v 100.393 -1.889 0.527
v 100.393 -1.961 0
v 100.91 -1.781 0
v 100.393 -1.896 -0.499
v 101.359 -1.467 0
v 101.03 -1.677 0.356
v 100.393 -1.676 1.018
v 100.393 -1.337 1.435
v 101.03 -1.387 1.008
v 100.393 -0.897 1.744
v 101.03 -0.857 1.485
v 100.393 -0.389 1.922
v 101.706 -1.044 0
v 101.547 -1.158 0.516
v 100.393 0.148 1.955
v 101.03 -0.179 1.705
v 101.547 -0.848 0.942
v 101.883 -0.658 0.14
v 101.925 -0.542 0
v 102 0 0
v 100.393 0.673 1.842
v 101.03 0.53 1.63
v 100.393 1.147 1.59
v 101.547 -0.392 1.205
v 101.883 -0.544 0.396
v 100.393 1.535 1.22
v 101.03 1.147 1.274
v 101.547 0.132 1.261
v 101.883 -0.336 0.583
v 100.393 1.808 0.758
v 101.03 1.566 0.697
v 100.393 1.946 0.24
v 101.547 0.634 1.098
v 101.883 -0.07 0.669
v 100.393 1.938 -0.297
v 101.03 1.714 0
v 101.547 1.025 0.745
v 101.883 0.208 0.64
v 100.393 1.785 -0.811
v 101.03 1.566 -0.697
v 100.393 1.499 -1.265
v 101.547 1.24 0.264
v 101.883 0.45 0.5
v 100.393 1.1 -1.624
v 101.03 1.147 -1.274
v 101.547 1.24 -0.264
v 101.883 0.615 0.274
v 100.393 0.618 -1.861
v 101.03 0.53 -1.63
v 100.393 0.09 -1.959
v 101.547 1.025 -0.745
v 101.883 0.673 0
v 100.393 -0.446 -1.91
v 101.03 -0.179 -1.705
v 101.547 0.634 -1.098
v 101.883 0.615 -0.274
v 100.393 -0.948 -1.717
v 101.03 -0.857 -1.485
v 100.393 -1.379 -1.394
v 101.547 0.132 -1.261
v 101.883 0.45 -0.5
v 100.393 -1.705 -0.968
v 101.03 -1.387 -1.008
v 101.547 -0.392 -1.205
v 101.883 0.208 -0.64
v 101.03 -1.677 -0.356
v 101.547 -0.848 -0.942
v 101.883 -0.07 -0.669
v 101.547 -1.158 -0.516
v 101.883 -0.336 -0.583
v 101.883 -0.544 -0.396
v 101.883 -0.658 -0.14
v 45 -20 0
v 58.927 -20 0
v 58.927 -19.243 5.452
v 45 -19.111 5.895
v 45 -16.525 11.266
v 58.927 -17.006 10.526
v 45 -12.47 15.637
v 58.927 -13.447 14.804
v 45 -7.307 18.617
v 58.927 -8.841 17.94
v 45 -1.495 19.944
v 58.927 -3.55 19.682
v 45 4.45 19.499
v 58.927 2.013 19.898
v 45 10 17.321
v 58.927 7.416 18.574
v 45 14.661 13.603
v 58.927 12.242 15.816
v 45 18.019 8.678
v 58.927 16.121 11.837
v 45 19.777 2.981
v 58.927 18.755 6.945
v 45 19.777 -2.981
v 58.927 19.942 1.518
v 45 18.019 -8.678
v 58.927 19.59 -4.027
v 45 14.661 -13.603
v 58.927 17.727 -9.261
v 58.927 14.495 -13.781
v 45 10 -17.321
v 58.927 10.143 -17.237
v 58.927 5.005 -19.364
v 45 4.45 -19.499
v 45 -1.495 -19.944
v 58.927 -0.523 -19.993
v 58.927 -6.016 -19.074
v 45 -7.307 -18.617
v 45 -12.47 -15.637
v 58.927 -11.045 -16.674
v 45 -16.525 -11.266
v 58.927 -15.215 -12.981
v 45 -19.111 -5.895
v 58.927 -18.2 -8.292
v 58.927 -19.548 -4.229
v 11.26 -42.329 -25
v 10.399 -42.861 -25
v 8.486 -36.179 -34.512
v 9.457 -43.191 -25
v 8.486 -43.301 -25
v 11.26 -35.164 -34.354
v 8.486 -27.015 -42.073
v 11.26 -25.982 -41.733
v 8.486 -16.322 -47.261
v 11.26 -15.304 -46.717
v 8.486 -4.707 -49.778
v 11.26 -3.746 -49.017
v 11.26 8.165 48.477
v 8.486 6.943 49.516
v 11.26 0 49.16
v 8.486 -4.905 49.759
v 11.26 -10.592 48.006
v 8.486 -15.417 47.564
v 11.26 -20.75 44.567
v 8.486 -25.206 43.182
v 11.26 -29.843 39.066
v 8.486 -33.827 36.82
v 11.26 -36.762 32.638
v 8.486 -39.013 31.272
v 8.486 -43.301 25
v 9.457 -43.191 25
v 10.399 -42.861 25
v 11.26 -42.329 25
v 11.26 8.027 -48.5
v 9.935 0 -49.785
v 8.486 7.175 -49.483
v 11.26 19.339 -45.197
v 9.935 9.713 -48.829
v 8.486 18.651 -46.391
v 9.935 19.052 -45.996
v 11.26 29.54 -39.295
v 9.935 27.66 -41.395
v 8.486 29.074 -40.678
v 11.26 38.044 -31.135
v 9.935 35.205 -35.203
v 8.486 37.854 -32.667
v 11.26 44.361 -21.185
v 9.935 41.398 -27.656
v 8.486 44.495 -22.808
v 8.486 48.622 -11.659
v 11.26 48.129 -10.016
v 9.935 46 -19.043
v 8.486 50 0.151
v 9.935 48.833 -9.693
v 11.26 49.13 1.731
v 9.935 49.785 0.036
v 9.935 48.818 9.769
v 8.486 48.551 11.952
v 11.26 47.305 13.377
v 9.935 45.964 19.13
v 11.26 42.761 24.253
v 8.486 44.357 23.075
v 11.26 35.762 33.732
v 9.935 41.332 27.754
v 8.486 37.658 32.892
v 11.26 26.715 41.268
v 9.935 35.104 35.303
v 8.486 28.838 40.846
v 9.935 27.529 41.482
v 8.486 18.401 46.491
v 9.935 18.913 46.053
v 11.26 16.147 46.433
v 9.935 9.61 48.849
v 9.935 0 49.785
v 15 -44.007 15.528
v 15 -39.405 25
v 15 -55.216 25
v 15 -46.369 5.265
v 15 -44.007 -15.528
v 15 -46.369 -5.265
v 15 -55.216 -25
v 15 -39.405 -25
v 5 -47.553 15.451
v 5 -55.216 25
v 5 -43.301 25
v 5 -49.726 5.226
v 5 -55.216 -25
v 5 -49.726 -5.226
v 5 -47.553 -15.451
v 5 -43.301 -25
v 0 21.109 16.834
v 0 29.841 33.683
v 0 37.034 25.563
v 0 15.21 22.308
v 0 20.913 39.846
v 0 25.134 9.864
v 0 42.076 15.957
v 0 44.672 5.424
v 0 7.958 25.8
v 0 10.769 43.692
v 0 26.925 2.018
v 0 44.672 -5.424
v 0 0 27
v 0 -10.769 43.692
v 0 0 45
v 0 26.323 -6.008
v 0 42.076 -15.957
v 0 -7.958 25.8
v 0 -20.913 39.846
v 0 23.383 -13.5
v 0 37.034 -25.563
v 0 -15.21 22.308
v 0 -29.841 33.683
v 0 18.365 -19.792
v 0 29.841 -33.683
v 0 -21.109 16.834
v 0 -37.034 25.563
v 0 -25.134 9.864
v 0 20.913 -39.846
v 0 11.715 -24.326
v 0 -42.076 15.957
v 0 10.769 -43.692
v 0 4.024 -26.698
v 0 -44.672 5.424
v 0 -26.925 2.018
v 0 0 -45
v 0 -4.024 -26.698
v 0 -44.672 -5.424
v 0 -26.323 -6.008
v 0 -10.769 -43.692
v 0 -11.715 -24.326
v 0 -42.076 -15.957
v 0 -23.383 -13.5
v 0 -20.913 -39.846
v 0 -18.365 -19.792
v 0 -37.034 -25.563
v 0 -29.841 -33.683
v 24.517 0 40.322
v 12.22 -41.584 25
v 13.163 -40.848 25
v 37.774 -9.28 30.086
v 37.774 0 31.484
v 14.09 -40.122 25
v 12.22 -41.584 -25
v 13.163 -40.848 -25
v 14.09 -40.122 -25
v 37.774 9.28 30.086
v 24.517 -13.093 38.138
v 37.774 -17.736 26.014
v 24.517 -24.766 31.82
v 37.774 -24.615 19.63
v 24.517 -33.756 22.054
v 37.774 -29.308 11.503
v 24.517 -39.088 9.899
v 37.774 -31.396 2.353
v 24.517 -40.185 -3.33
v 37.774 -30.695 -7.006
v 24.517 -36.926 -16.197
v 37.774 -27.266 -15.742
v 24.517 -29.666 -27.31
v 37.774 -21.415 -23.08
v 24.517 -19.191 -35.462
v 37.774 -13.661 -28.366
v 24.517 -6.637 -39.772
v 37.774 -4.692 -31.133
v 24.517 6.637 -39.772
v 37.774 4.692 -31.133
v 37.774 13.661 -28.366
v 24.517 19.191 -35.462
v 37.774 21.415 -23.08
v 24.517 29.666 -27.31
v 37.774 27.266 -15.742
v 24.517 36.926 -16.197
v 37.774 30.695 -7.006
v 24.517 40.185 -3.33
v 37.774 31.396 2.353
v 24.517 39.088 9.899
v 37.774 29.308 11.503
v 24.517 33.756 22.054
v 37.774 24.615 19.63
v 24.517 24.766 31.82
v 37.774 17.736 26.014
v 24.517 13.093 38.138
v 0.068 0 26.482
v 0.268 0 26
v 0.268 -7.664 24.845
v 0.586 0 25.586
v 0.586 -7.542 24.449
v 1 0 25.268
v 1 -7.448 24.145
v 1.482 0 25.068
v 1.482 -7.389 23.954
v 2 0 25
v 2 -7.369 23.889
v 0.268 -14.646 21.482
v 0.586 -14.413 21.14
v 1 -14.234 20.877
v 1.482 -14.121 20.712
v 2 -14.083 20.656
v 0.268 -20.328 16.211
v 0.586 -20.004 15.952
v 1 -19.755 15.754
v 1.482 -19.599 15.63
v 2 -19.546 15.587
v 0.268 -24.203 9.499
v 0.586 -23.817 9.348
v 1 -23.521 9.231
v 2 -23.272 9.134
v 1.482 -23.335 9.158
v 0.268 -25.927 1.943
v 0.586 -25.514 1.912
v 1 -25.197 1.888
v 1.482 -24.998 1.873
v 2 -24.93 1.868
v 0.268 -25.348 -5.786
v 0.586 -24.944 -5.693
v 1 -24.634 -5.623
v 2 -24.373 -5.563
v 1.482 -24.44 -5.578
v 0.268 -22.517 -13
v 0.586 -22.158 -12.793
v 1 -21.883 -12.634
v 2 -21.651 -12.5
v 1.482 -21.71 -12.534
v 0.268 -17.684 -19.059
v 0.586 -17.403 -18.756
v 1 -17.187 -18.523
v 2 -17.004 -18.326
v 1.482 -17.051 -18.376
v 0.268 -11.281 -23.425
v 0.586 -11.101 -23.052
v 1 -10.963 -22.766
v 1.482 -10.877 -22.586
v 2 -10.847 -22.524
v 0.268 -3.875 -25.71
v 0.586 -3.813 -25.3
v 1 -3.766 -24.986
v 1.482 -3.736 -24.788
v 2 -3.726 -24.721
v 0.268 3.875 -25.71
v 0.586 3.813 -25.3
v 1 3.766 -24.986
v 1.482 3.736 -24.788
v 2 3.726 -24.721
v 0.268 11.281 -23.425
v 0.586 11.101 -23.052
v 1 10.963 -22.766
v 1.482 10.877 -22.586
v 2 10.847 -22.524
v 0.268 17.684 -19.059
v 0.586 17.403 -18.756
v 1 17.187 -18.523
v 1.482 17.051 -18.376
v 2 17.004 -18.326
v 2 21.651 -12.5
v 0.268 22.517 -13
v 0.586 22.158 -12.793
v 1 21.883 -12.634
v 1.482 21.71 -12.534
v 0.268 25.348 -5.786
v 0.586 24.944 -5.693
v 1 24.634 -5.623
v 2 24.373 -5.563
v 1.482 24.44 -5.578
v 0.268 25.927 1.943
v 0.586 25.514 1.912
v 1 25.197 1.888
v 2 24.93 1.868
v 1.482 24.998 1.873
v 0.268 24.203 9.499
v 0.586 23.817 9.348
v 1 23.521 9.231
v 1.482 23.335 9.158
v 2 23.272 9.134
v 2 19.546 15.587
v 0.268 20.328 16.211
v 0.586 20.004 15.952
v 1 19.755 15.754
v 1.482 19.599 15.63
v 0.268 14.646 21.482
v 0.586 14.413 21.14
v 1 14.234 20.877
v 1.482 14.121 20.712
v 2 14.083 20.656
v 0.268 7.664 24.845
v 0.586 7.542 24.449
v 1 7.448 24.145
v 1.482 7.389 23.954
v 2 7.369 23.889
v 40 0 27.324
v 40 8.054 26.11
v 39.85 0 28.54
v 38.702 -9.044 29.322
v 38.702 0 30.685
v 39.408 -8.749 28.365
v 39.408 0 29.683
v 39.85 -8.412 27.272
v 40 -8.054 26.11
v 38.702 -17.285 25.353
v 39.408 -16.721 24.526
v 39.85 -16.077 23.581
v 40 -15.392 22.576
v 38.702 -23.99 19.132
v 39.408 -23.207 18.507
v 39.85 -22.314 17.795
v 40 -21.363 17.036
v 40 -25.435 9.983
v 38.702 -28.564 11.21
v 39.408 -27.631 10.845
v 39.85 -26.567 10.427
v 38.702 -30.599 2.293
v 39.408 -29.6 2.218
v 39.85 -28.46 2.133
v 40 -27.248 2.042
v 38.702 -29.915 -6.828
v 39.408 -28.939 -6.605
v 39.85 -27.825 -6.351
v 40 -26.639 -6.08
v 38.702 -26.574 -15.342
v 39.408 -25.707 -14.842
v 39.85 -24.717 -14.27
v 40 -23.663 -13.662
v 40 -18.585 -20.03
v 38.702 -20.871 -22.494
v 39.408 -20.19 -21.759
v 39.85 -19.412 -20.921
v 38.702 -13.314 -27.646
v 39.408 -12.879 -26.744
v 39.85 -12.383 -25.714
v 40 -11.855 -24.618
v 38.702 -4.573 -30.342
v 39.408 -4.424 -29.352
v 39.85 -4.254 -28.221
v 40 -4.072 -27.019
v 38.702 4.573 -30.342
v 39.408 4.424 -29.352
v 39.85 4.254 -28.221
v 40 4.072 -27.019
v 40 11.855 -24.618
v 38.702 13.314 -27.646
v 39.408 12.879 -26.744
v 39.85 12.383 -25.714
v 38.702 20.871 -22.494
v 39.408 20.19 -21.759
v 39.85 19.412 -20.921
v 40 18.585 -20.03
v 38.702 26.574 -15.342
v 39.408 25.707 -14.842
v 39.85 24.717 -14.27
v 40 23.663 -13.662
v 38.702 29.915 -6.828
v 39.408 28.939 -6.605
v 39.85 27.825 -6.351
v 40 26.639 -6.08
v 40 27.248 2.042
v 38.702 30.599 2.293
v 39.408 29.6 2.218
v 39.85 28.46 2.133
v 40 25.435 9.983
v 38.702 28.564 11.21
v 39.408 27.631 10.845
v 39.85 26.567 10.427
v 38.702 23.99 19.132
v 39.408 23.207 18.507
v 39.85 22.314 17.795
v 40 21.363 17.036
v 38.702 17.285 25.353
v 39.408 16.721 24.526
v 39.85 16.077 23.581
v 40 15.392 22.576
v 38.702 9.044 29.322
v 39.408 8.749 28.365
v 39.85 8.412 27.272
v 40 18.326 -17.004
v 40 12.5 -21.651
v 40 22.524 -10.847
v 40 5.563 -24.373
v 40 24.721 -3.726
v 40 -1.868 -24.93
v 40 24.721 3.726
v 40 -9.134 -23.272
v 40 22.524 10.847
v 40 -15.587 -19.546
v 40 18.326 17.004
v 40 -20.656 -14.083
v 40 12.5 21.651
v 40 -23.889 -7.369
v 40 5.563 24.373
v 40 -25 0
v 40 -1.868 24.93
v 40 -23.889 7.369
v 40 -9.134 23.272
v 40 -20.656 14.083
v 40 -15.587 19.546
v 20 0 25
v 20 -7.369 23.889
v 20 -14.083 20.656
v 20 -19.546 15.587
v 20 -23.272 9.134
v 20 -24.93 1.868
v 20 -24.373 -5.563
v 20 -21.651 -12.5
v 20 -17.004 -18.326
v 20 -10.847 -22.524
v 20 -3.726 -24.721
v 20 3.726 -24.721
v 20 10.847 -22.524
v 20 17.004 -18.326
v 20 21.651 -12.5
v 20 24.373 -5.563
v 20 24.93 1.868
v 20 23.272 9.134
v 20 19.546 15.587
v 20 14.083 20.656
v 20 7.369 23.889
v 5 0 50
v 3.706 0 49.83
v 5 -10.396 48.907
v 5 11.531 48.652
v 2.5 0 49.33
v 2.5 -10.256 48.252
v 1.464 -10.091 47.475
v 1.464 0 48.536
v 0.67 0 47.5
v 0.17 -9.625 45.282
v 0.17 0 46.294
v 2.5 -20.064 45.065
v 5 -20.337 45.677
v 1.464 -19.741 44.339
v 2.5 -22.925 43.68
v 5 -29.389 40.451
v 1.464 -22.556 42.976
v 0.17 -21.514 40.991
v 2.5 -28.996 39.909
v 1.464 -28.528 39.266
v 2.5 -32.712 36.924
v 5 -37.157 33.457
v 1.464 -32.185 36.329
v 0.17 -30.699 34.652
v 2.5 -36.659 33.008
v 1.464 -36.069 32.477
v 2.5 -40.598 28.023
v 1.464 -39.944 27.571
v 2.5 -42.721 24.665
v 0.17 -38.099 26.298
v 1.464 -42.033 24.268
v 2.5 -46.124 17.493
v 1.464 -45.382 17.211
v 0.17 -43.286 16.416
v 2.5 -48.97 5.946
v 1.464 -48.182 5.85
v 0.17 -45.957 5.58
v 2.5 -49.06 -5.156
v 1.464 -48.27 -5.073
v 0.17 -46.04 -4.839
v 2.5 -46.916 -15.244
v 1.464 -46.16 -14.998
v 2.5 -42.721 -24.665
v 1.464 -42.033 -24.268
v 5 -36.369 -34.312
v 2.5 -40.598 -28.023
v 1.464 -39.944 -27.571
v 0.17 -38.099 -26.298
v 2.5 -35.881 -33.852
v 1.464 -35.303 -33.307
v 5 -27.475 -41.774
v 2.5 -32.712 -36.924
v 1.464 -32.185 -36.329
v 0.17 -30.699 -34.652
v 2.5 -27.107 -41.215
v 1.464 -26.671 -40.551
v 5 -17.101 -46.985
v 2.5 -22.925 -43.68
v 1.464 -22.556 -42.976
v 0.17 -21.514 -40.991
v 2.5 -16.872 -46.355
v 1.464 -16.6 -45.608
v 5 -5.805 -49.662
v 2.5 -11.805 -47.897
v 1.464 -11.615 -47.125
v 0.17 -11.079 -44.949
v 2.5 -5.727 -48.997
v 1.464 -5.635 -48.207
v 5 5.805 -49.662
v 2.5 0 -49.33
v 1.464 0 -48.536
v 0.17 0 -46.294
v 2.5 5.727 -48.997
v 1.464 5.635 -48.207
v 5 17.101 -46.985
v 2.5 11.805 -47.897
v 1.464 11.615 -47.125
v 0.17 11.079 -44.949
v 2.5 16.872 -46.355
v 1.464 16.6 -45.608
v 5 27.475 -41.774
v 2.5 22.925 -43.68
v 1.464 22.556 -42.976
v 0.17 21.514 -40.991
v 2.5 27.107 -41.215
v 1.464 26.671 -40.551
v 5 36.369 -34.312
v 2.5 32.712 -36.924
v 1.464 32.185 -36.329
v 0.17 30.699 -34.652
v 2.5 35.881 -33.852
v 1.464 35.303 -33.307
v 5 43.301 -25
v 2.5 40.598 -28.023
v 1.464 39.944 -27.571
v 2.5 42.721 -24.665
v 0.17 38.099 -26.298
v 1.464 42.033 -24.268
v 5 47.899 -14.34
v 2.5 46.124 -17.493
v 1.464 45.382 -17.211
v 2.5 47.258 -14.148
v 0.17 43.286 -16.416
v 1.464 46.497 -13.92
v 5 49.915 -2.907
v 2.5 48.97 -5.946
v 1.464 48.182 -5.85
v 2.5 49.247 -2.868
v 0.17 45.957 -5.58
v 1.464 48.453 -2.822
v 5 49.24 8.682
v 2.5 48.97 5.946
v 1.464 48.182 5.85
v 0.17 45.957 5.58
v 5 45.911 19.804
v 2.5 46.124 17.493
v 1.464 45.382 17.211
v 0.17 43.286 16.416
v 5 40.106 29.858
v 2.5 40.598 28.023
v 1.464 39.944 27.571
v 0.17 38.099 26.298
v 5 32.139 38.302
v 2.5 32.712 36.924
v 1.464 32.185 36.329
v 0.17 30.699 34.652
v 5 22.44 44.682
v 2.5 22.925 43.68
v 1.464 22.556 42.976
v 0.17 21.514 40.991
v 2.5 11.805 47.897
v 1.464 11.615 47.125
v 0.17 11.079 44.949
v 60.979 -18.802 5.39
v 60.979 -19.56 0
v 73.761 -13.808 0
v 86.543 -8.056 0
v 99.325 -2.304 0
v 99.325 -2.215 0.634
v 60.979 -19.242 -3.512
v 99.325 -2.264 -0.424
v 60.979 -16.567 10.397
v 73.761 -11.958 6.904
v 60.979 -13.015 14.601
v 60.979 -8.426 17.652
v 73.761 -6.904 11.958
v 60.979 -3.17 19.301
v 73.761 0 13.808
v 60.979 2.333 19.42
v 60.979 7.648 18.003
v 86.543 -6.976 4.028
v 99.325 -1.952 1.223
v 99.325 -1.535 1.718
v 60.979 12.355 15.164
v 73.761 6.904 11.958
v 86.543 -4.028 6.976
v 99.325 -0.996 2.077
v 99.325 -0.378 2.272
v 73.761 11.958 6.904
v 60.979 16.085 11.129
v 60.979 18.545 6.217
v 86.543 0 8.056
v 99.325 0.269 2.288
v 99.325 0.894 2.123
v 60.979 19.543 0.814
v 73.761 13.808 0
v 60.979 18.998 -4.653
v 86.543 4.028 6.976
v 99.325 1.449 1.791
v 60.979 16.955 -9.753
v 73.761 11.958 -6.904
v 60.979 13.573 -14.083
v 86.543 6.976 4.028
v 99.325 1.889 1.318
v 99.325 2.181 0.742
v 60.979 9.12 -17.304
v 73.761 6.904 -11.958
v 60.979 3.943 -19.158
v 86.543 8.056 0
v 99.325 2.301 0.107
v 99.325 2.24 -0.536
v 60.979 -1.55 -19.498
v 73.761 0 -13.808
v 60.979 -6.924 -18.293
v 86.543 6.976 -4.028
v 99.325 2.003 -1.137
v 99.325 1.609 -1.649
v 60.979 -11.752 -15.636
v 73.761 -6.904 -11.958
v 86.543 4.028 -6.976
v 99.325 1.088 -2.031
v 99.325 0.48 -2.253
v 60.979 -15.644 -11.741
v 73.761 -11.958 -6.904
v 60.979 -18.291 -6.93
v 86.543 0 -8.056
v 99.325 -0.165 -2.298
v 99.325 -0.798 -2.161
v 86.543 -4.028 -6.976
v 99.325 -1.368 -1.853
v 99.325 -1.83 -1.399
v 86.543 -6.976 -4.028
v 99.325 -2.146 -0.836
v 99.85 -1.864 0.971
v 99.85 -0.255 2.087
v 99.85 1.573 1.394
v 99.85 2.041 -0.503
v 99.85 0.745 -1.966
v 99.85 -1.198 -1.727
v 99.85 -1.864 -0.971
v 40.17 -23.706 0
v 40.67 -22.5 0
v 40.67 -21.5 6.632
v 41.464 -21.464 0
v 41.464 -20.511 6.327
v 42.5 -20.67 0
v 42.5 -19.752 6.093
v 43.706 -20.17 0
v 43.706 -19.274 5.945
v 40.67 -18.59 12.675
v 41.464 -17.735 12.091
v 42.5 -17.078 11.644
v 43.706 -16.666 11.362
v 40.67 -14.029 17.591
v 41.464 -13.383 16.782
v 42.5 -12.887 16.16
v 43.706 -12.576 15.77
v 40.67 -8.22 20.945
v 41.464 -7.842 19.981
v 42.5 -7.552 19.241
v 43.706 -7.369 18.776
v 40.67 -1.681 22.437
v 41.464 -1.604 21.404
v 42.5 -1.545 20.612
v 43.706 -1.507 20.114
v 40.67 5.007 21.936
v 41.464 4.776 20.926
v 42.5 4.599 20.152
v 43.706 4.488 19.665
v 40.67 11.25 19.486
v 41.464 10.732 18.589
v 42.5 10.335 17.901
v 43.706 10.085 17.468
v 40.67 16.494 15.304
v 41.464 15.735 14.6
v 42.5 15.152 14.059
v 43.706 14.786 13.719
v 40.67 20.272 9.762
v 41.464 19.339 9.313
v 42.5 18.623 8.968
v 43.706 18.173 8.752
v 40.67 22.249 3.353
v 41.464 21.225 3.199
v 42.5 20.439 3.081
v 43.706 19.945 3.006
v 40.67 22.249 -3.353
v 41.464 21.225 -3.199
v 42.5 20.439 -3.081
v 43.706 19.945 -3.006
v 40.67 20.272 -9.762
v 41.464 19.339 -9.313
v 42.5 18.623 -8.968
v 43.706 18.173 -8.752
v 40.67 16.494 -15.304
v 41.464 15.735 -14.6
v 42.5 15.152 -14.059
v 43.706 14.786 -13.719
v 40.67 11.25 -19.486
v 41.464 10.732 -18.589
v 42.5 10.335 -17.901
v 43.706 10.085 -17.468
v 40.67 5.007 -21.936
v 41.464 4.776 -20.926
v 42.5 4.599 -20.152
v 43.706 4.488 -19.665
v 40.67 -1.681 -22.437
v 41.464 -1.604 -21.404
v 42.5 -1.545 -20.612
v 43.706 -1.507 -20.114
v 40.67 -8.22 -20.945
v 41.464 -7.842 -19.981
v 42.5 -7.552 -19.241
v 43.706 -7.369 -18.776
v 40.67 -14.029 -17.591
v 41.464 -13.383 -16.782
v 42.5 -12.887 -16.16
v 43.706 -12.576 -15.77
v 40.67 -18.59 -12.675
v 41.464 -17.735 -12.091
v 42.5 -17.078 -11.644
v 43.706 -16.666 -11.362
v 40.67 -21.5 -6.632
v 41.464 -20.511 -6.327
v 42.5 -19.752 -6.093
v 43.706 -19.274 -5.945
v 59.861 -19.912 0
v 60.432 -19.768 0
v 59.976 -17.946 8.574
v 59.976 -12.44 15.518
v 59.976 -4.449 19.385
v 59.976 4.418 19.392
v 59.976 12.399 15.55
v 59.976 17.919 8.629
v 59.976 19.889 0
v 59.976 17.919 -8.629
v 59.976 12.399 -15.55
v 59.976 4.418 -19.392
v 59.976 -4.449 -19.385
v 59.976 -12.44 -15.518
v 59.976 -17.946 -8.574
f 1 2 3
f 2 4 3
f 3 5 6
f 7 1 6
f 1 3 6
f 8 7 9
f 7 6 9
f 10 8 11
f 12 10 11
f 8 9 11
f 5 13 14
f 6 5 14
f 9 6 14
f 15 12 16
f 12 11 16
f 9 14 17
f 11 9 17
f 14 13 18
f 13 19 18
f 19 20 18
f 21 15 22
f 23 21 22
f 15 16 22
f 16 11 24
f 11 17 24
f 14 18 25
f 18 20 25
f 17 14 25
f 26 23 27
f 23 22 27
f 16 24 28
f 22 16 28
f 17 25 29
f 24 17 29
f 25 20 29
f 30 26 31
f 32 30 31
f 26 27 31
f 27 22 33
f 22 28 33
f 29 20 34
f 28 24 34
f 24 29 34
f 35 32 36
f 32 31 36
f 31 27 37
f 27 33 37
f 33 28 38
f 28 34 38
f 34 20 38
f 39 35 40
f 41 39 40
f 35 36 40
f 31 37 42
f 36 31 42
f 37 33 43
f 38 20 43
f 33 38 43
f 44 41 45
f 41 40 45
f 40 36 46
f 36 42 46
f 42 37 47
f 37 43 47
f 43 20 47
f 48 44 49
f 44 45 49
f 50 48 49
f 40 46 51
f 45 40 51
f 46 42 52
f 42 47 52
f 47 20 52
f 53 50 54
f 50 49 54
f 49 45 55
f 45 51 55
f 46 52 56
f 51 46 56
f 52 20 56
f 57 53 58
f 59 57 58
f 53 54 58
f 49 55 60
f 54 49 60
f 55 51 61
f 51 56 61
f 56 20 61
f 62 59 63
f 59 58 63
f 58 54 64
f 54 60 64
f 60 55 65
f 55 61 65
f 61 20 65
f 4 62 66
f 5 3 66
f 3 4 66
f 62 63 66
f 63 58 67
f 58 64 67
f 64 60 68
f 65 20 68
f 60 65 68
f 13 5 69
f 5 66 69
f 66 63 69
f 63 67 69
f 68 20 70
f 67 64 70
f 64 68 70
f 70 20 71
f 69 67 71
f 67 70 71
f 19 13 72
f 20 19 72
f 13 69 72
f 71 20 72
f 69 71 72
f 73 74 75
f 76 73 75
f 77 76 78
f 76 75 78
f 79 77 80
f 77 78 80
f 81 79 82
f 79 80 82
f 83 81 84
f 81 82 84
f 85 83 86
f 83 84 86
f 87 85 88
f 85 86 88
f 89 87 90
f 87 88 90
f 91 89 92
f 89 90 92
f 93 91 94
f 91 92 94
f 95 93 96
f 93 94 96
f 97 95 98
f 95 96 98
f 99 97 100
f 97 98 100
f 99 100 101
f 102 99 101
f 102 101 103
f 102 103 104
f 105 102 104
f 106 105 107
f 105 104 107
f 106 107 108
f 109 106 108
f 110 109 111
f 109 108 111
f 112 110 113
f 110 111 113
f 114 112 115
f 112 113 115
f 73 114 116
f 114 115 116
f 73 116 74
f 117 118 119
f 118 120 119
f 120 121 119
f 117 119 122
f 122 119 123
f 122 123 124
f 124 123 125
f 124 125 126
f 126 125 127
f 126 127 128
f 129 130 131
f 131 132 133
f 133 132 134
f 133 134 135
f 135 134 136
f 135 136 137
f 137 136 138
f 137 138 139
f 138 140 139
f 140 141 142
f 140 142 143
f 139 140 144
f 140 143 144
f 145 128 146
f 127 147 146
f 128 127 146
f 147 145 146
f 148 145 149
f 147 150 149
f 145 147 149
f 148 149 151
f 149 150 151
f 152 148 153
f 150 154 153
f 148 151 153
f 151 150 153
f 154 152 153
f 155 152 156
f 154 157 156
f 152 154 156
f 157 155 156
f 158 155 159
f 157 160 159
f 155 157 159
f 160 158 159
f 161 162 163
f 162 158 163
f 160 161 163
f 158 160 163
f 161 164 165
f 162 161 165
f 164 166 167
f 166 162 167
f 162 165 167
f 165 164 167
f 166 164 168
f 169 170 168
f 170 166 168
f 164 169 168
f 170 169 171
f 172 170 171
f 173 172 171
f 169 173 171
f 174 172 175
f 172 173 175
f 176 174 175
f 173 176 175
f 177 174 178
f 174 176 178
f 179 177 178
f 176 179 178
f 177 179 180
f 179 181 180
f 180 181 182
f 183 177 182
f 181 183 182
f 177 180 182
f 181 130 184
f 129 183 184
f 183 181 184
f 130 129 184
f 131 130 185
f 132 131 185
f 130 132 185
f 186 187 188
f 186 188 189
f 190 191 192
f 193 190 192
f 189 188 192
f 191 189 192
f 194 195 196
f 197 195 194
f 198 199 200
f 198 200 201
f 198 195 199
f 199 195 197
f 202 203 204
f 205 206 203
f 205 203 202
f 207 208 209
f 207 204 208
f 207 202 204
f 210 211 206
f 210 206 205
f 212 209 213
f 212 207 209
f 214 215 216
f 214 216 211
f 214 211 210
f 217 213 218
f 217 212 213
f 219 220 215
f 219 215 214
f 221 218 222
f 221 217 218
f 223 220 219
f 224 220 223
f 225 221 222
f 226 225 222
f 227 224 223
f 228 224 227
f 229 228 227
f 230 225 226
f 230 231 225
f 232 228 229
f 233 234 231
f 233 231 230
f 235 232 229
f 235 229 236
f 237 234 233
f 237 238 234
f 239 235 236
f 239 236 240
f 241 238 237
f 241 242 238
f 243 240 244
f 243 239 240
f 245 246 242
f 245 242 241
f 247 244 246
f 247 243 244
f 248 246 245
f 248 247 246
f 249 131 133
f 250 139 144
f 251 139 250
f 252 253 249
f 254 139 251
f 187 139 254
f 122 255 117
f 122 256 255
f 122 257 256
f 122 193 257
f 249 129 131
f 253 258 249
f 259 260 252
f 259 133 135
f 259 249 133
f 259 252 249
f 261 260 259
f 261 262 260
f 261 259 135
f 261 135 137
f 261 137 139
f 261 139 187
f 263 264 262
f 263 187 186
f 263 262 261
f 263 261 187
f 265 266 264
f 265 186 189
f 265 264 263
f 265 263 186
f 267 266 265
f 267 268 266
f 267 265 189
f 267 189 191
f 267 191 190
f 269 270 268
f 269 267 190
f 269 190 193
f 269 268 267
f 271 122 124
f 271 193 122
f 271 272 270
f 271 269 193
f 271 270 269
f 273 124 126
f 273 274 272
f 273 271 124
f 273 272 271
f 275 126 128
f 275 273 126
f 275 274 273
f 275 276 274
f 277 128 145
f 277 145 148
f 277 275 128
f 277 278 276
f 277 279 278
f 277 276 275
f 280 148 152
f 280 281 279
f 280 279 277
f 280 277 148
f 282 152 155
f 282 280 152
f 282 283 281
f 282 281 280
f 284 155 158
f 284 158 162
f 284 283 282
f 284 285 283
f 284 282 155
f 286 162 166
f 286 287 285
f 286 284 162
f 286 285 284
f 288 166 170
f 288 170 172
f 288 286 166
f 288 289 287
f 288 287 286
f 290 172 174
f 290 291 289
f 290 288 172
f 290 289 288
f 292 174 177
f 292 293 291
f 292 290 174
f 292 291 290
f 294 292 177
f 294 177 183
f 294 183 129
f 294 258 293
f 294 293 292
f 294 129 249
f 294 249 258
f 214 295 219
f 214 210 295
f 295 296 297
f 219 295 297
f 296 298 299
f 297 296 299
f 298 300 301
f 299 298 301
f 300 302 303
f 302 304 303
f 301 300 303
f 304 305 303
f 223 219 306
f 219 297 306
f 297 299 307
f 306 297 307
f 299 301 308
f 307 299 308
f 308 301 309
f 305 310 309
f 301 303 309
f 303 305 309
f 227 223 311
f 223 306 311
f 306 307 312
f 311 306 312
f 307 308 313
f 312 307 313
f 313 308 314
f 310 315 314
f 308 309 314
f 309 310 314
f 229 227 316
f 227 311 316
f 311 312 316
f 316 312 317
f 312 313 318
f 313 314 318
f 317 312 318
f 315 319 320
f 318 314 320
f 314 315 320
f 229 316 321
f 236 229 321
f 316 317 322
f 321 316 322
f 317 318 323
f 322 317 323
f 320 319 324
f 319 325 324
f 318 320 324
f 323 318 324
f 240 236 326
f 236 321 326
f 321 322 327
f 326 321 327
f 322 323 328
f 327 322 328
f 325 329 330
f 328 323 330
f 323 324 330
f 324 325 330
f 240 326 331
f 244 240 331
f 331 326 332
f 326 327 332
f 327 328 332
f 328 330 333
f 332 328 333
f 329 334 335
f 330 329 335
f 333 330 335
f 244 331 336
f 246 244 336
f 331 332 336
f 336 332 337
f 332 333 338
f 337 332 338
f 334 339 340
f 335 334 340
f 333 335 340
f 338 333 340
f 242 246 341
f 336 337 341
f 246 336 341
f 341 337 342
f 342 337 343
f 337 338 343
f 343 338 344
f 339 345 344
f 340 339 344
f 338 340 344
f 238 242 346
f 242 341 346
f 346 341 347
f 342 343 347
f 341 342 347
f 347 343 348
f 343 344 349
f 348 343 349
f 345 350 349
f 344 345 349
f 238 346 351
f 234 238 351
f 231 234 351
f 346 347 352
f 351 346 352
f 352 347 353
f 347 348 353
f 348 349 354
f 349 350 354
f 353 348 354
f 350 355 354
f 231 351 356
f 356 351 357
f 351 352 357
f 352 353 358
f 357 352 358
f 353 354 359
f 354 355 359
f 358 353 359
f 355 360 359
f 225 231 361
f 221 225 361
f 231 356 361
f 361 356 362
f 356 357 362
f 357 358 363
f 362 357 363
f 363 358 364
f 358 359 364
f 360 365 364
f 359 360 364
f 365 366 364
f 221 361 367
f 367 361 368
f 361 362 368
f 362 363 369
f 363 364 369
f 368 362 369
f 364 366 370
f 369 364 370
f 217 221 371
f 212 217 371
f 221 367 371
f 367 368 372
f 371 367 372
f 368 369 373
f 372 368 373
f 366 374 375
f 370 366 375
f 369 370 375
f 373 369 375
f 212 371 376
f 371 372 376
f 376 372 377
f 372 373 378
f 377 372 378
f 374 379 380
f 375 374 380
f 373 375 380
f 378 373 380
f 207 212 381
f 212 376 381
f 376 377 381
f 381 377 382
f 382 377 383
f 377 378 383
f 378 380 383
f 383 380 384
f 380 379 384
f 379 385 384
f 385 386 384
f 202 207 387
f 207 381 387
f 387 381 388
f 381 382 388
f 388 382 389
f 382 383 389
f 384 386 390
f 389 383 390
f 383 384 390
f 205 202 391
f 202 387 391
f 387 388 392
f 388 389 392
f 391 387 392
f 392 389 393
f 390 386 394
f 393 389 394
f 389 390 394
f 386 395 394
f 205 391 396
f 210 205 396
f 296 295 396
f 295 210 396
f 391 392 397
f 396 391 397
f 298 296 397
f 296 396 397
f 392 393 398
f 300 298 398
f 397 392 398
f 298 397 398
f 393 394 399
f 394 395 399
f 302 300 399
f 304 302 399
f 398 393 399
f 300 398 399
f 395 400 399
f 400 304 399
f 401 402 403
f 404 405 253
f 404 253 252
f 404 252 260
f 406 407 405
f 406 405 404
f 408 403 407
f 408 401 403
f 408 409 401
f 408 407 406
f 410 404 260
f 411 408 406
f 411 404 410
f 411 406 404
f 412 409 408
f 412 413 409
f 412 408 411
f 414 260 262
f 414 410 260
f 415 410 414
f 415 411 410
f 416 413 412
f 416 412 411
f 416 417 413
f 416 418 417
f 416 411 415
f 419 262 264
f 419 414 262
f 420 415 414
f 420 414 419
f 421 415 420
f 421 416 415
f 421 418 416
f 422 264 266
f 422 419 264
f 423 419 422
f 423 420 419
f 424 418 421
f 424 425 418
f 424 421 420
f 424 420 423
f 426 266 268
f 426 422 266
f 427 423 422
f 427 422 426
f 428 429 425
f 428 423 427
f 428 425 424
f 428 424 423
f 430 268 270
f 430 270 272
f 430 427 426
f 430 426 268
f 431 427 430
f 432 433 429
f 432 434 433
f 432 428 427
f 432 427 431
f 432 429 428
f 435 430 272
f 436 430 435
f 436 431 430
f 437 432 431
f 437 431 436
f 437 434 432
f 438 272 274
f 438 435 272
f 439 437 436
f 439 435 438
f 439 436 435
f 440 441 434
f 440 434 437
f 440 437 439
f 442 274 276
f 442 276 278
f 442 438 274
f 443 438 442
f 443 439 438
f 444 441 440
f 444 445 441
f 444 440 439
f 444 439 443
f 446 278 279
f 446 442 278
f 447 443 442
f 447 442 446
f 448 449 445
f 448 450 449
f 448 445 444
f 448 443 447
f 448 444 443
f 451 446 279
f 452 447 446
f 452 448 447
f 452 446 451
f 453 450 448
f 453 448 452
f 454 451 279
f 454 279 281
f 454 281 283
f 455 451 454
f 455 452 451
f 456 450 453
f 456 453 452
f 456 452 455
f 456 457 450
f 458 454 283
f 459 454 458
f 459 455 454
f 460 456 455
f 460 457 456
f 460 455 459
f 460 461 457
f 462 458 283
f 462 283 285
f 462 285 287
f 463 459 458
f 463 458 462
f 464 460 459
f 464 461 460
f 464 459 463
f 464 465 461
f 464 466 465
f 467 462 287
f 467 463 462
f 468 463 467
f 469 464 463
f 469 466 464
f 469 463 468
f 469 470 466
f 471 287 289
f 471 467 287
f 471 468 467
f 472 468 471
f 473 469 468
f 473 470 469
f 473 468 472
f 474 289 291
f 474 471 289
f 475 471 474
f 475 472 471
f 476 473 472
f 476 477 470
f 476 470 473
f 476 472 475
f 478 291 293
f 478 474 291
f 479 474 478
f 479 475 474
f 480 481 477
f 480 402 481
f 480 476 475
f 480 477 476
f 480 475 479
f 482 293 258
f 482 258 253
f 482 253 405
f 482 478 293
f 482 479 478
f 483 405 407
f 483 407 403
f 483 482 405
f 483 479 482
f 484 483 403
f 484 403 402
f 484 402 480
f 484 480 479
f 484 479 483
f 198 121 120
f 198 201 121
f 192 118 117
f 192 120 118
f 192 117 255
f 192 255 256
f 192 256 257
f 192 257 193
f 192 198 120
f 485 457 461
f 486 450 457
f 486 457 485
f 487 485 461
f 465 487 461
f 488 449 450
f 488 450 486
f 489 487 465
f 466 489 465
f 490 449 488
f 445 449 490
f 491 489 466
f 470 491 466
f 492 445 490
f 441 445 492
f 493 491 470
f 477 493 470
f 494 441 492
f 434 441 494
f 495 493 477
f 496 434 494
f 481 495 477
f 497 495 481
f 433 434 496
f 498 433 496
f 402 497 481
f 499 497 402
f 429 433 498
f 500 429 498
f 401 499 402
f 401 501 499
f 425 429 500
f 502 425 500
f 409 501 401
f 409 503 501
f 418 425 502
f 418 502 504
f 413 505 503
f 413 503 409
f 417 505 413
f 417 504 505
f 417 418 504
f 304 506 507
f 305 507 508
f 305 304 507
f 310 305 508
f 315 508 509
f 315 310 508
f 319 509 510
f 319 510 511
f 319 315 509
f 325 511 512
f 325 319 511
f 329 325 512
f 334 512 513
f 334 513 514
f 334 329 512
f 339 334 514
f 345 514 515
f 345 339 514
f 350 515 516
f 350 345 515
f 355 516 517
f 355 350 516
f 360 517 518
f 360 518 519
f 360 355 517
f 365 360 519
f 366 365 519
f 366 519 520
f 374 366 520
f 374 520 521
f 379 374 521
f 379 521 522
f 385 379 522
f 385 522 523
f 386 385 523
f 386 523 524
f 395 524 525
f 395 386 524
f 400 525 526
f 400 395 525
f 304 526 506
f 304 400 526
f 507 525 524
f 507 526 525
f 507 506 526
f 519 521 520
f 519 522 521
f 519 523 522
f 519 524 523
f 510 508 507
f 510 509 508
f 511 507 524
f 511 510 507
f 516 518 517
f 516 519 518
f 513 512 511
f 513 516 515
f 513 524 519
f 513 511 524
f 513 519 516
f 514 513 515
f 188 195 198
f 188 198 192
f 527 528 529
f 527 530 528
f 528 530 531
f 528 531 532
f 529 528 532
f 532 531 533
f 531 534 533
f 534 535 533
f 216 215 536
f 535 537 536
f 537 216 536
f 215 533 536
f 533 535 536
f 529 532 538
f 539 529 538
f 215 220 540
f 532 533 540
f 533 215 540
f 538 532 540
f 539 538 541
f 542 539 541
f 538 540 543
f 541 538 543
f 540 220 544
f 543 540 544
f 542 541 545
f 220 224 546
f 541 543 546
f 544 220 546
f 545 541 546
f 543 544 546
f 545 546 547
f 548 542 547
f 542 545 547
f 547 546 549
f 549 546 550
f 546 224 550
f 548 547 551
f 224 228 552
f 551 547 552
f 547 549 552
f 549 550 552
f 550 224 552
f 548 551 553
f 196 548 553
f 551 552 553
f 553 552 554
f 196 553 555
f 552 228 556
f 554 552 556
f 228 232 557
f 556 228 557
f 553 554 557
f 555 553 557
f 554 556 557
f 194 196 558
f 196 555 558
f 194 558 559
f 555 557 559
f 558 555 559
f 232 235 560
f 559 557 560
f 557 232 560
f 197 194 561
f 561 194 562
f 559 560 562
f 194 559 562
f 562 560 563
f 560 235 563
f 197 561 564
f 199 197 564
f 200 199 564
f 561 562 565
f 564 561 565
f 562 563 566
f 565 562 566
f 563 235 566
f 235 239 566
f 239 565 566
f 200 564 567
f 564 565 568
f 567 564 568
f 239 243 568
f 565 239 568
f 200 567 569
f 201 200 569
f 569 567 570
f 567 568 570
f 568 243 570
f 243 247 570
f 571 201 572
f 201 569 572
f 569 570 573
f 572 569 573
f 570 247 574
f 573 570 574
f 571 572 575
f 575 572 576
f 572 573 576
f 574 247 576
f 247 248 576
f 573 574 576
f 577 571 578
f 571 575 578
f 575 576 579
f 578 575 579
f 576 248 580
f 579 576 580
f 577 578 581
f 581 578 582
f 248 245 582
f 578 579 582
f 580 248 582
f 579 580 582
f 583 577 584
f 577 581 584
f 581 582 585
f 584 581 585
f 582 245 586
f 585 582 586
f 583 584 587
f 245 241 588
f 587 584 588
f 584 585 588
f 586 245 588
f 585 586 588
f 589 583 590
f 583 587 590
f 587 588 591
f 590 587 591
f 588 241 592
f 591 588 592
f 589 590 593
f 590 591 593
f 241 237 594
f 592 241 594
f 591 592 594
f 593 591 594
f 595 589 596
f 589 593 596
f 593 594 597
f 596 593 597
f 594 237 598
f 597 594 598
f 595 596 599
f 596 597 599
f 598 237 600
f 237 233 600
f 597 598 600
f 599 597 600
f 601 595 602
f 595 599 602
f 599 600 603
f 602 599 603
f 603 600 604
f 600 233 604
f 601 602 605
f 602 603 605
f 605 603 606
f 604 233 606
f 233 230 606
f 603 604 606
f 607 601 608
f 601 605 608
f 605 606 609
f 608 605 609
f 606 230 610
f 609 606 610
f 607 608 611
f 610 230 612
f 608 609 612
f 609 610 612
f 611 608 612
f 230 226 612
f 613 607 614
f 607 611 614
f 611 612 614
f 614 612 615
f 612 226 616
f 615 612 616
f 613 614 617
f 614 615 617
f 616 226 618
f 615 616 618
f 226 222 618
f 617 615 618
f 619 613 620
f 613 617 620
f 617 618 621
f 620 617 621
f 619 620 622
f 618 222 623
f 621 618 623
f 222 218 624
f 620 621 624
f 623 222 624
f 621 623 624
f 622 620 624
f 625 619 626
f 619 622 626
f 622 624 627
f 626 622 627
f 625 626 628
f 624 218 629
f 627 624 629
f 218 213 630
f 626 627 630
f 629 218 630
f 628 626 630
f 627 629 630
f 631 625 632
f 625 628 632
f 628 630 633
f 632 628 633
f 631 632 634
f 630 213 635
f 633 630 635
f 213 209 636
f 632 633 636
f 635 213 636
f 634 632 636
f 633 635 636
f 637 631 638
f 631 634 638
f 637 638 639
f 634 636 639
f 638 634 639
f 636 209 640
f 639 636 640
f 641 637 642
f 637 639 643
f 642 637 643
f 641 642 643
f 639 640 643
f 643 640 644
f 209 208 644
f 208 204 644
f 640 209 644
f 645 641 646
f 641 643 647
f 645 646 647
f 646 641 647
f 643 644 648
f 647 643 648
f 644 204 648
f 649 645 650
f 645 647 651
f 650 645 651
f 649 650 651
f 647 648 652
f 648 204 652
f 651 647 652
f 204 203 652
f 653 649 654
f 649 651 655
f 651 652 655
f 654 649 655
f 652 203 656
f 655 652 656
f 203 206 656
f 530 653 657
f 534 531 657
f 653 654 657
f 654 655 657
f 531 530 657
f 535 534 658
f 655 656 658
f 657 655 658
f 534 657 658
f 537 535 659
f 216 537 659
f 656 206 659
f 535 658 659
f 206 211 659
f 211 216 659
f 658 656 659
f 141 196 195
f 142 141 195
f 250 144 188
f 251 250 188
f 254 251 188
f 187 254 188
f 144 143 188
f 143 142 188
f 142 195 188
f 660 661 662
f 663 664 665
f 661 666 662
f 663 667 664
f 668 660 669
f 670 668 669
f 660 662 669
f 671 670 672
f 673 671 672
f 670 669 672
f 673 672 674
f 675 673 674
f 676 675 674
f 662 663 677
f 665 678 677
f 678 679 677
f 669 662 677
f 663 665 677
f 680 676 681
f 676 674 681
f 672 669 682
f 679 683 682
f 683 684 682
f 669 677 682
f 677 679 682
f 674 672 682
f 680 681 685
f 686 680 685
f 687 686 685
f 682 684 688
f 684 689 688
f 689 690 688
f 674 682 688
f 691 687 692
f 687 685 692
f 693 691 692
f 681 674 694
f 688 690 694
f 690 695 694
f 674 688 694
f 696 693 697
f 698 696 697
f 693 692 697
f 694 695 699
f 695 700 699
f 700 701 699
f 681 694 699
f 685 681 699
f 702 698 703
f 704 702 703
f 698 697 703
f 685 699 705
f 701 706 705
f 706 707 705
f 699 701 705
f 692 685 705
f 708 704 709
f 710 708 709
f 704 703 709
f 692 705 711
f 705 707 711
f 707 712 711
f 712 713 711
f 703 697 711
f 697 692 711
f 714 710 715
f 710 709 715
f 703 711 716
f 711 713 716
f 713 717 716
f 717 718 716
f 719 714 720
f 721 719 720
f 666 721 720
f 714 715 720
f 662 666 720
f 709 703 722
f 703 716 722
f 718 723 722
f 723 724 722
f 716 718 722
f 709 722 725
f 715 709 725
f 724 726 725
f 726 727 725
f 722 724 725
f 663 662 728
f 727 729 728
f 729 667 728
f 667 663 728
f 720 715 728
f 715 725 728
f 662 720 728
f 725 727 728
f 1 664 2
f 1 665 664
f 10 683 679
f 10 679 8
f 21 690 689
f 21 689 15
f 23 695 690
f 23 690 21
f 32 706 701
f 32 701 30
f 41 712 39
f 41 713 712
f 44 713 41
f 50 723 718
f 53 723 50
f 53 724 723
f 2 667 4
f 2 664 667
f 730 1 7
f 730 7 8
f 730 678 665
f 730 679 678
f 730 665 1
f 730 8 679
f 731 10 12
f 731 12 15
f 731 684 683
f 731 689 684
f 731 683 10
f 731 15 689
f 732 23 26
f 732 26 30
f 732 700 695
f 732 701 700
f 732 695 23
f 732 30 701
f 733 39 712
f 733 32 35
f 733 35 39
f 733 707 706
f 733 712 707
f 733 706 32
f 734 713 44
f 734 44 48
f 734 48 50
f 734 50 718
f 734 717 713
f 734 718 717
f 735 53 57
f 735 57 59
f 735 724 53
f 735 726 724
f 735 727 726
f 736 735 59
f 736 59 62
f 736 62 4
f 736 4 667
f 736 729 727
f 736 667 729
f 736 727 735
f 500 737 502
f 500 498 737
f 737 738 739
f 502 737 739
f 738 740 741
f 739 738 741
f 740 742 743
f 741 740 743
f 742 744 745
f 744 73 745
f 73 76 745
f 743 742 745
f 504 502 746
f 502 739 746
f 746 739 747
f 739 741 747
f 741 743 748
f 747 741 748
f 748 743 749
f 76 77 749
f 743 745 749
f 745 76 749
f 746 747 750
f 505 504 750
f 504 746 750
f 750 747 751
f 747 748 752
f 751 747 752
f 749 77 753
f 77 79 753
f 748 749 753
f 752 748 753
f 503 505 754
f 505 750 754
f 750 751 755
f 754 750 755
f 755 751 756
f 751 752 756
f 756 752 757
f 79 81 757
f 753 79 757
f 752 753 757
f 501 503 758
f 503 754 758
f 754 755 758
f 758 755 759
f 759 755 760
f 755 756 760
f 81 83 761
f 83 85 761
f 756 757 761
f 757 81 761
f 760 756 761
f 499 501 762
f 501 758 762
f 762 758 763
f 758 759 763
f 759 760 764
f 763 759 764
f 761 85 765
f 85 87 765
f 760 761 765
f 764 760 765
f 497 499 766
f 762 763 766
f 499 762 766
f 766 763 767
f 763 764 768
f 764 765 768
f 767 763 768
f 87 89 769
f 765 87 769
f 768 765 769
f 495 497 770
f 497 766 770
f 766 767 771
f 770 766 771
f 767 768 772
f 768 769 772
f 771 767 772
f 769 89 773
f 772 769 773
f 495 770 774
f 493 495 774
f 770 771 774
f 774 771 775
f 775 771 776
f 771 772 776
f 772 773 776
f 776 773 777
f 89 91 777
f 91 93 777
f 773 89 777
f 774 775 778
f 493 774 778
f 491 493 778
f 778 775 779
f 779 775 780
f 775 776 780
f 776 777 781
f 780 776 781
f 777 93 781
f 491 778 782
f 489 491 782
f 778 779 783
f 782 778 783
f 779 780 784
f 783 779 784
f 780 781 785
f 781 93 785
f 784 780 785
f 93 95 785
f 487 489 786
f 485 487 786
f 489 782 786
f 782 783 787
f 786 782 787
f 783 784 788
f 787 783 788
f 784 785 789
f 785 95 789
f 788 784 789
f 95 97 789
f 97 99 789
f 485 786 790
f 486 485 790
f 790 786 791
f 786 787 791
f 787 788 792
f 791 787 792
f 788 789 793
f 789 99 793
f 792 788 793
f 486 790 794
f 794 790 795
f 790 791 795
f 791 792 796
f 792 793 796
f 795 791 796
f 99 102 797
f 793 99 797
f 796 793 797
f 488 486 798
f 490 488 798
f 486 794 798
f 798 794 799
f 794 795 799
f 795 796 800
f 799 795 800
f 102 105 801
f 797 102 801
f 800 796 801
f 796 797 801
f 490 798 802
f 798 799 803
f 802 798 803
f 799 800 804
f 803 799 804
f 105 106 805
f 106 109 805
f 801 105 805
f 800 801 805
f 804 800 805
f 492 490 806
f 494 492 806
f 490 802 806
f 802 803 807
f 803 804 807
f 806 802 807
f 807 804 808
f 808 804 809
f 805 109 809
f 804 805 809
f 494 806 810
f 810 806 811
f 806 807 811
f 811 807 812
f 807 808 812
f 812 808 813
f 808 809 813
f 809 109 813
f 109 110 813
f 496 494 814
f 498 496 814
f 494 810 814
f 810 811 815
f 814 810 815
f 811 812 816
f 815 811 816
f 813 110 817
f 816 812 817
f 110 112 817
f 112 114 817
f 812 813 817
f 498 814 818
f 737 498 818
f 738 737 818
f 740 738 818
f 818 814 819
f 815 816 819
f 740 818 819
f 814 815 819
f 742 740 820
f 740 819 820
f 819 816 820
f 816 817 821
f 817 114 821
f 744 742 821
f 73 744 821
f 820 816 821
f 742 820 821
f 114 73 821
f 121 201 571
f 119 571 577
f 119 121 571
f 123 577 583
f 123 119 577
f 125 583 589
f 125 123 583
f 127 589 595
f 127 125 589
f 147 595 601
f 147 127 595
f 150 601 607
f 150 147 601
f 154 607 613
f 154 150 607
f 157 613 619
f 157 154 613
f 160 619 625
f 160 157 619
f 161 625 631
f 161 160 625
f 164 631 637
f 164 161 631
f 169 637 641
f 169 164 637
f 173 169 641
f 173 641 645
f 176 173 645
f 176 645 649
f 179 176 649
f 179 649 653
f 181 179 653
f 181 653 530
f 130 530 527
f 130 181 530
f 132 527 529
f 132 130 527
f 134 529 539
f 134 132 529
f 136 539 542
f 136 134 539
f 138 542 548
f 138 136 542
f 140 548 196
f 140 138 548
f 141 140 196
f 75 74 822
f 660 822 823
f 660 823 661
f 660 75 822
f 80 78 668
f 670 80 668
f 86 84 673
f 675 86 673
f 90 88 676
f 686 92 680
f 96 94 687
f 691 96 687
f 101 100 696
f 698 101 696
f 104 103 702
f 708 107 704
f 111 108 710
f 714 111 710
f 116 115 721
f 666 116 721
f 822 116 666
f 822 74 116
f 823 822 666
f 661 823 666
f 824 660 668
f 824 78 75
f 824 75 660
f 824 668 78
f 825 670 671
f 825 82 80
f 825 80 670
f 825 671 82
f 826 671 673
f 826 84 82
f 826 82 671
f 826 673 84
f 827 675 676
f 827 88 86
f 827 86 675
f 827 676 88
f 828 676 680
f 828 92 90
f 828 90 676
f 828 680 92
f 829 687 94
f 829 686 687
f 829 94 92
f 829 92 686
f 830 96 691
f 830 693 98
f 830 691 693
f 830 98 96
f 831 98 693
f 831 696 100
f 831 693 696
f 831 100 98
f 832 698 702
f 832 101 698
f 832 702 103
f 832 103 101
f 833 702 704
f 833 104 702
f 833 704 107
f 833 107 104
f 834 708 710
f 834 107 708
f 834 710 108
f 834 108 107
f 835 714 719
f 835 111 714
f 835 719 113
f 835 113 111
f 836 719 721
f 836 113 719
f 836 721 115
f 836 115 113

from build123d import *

# Parameters (mm, degrees)
FILLET1_R           = 5
FILLET2_R           = 5
FILLET3_R           = 2
SKETCH3_W           = 10
SKETCH3_H           = 5
BOSS_EXTRUDE1_DEPTH = 25
BOSS_EXTRUDE2_REACH = 153.483
SKETCH4_W           = 10
SKETCH4_H           = 50


with BuildPart() as part:
    # Sketch1 → Revolve1 (revolve)
    with BuildSketch(Plane.XY, mode=Mode.PRIVATE) as revolve1_sk:
        Polygon((0, -50), (10, -50), (40, -30), (40, 0), (20, 0), (20, -25), (0, -25), align=None)
    revolve(revolve1_sk.sketch.rotate(Axis((-91.89476197, 0, 0), (1, 0, 0)), 270), axis=Axis((-91.89476197, 0, 0), (1, 0, 0)))

    # Sketch2 → Revolve3 (revolve)
    with BuildSketch(Plane.XY):
        with BuildLine():
            Line((40, -20), (60, -20))
            Line((60, -20), (100, -2))
            ThreePointArc((100, -2), (101.414213562, -1.414213562), (102, 0))
            Line((102, 0), (100, 0))
            Line((100, 0), (40, 0))
            Line((40, 0), (40, -20))
        make_face()
    revolve(axis=Axis((100, 0, 0), (-1, 0, 0)))

    # Fillet1
    fillet1_edges = [part.edges().sort_by_distance(p)[0] for p in [
        (40, 20, 0),
        (60, 20, 0),
        (40, 0, -30),
        (10, 0, -50),
        (0, 0, -50),
    ]]
    fillet(fillet1_edges, radius=FILLET1_R)

    # Fillet2
    fillet2_edges = [part.edges().sort_by_distance(p)[0] for p in [
        (100, 2, 0),
    ]]
    fillet(fillet2_edges, radius=FILLET2_R)

    # Fillet3
    fillet3_edges = [part.edges().sort_by_distance(p)[0] for p in [
        (0, 0, -25),
    ]]
    fillet(fillet3_edges, radius=FILLET3_R)

    # Sketch4 → Boss-Extrude2 (add, up to next)
    with BuildSketch(Plane(origin=(0, -50.215600765, 0), x_dir=(1, 0, 0), z_dir=(0, 1, 0)), mode=Mode.PRIVATE) as boss_extrude2_sk1:
        with Locations((10, 0)):
            Rectangle(SKETCH4_W, SKETCH4_H)
    boss_extrude2_tool1 = extrude(boss_extrude2_sk1.sketch, amount=BOSS_EXTRUDE2_REACH, mode=Mode.PRIVATE) - part.part


with BuildPart() as body_2:
    # Sketch3 → Boss-Extrude1 (new, symmetric)
    with BuildSketch(Plane.XY):
        with Locations((10, -52.715600765)):
            Rectangle(SKETCH3_W, SKETCH3_H)
    extrude(amount=BOSS_EXTRUDE1_DEPTH, both=True)


with BuildPart() as part_1:
    add(part.part)

    add(body_2.part)  # Boss-Extrude2 merges body 2
    add(boss_extrude2_tool1.solids().sort_by_distance((10, -50.215601, 0))[0])


solid = part_1.part
